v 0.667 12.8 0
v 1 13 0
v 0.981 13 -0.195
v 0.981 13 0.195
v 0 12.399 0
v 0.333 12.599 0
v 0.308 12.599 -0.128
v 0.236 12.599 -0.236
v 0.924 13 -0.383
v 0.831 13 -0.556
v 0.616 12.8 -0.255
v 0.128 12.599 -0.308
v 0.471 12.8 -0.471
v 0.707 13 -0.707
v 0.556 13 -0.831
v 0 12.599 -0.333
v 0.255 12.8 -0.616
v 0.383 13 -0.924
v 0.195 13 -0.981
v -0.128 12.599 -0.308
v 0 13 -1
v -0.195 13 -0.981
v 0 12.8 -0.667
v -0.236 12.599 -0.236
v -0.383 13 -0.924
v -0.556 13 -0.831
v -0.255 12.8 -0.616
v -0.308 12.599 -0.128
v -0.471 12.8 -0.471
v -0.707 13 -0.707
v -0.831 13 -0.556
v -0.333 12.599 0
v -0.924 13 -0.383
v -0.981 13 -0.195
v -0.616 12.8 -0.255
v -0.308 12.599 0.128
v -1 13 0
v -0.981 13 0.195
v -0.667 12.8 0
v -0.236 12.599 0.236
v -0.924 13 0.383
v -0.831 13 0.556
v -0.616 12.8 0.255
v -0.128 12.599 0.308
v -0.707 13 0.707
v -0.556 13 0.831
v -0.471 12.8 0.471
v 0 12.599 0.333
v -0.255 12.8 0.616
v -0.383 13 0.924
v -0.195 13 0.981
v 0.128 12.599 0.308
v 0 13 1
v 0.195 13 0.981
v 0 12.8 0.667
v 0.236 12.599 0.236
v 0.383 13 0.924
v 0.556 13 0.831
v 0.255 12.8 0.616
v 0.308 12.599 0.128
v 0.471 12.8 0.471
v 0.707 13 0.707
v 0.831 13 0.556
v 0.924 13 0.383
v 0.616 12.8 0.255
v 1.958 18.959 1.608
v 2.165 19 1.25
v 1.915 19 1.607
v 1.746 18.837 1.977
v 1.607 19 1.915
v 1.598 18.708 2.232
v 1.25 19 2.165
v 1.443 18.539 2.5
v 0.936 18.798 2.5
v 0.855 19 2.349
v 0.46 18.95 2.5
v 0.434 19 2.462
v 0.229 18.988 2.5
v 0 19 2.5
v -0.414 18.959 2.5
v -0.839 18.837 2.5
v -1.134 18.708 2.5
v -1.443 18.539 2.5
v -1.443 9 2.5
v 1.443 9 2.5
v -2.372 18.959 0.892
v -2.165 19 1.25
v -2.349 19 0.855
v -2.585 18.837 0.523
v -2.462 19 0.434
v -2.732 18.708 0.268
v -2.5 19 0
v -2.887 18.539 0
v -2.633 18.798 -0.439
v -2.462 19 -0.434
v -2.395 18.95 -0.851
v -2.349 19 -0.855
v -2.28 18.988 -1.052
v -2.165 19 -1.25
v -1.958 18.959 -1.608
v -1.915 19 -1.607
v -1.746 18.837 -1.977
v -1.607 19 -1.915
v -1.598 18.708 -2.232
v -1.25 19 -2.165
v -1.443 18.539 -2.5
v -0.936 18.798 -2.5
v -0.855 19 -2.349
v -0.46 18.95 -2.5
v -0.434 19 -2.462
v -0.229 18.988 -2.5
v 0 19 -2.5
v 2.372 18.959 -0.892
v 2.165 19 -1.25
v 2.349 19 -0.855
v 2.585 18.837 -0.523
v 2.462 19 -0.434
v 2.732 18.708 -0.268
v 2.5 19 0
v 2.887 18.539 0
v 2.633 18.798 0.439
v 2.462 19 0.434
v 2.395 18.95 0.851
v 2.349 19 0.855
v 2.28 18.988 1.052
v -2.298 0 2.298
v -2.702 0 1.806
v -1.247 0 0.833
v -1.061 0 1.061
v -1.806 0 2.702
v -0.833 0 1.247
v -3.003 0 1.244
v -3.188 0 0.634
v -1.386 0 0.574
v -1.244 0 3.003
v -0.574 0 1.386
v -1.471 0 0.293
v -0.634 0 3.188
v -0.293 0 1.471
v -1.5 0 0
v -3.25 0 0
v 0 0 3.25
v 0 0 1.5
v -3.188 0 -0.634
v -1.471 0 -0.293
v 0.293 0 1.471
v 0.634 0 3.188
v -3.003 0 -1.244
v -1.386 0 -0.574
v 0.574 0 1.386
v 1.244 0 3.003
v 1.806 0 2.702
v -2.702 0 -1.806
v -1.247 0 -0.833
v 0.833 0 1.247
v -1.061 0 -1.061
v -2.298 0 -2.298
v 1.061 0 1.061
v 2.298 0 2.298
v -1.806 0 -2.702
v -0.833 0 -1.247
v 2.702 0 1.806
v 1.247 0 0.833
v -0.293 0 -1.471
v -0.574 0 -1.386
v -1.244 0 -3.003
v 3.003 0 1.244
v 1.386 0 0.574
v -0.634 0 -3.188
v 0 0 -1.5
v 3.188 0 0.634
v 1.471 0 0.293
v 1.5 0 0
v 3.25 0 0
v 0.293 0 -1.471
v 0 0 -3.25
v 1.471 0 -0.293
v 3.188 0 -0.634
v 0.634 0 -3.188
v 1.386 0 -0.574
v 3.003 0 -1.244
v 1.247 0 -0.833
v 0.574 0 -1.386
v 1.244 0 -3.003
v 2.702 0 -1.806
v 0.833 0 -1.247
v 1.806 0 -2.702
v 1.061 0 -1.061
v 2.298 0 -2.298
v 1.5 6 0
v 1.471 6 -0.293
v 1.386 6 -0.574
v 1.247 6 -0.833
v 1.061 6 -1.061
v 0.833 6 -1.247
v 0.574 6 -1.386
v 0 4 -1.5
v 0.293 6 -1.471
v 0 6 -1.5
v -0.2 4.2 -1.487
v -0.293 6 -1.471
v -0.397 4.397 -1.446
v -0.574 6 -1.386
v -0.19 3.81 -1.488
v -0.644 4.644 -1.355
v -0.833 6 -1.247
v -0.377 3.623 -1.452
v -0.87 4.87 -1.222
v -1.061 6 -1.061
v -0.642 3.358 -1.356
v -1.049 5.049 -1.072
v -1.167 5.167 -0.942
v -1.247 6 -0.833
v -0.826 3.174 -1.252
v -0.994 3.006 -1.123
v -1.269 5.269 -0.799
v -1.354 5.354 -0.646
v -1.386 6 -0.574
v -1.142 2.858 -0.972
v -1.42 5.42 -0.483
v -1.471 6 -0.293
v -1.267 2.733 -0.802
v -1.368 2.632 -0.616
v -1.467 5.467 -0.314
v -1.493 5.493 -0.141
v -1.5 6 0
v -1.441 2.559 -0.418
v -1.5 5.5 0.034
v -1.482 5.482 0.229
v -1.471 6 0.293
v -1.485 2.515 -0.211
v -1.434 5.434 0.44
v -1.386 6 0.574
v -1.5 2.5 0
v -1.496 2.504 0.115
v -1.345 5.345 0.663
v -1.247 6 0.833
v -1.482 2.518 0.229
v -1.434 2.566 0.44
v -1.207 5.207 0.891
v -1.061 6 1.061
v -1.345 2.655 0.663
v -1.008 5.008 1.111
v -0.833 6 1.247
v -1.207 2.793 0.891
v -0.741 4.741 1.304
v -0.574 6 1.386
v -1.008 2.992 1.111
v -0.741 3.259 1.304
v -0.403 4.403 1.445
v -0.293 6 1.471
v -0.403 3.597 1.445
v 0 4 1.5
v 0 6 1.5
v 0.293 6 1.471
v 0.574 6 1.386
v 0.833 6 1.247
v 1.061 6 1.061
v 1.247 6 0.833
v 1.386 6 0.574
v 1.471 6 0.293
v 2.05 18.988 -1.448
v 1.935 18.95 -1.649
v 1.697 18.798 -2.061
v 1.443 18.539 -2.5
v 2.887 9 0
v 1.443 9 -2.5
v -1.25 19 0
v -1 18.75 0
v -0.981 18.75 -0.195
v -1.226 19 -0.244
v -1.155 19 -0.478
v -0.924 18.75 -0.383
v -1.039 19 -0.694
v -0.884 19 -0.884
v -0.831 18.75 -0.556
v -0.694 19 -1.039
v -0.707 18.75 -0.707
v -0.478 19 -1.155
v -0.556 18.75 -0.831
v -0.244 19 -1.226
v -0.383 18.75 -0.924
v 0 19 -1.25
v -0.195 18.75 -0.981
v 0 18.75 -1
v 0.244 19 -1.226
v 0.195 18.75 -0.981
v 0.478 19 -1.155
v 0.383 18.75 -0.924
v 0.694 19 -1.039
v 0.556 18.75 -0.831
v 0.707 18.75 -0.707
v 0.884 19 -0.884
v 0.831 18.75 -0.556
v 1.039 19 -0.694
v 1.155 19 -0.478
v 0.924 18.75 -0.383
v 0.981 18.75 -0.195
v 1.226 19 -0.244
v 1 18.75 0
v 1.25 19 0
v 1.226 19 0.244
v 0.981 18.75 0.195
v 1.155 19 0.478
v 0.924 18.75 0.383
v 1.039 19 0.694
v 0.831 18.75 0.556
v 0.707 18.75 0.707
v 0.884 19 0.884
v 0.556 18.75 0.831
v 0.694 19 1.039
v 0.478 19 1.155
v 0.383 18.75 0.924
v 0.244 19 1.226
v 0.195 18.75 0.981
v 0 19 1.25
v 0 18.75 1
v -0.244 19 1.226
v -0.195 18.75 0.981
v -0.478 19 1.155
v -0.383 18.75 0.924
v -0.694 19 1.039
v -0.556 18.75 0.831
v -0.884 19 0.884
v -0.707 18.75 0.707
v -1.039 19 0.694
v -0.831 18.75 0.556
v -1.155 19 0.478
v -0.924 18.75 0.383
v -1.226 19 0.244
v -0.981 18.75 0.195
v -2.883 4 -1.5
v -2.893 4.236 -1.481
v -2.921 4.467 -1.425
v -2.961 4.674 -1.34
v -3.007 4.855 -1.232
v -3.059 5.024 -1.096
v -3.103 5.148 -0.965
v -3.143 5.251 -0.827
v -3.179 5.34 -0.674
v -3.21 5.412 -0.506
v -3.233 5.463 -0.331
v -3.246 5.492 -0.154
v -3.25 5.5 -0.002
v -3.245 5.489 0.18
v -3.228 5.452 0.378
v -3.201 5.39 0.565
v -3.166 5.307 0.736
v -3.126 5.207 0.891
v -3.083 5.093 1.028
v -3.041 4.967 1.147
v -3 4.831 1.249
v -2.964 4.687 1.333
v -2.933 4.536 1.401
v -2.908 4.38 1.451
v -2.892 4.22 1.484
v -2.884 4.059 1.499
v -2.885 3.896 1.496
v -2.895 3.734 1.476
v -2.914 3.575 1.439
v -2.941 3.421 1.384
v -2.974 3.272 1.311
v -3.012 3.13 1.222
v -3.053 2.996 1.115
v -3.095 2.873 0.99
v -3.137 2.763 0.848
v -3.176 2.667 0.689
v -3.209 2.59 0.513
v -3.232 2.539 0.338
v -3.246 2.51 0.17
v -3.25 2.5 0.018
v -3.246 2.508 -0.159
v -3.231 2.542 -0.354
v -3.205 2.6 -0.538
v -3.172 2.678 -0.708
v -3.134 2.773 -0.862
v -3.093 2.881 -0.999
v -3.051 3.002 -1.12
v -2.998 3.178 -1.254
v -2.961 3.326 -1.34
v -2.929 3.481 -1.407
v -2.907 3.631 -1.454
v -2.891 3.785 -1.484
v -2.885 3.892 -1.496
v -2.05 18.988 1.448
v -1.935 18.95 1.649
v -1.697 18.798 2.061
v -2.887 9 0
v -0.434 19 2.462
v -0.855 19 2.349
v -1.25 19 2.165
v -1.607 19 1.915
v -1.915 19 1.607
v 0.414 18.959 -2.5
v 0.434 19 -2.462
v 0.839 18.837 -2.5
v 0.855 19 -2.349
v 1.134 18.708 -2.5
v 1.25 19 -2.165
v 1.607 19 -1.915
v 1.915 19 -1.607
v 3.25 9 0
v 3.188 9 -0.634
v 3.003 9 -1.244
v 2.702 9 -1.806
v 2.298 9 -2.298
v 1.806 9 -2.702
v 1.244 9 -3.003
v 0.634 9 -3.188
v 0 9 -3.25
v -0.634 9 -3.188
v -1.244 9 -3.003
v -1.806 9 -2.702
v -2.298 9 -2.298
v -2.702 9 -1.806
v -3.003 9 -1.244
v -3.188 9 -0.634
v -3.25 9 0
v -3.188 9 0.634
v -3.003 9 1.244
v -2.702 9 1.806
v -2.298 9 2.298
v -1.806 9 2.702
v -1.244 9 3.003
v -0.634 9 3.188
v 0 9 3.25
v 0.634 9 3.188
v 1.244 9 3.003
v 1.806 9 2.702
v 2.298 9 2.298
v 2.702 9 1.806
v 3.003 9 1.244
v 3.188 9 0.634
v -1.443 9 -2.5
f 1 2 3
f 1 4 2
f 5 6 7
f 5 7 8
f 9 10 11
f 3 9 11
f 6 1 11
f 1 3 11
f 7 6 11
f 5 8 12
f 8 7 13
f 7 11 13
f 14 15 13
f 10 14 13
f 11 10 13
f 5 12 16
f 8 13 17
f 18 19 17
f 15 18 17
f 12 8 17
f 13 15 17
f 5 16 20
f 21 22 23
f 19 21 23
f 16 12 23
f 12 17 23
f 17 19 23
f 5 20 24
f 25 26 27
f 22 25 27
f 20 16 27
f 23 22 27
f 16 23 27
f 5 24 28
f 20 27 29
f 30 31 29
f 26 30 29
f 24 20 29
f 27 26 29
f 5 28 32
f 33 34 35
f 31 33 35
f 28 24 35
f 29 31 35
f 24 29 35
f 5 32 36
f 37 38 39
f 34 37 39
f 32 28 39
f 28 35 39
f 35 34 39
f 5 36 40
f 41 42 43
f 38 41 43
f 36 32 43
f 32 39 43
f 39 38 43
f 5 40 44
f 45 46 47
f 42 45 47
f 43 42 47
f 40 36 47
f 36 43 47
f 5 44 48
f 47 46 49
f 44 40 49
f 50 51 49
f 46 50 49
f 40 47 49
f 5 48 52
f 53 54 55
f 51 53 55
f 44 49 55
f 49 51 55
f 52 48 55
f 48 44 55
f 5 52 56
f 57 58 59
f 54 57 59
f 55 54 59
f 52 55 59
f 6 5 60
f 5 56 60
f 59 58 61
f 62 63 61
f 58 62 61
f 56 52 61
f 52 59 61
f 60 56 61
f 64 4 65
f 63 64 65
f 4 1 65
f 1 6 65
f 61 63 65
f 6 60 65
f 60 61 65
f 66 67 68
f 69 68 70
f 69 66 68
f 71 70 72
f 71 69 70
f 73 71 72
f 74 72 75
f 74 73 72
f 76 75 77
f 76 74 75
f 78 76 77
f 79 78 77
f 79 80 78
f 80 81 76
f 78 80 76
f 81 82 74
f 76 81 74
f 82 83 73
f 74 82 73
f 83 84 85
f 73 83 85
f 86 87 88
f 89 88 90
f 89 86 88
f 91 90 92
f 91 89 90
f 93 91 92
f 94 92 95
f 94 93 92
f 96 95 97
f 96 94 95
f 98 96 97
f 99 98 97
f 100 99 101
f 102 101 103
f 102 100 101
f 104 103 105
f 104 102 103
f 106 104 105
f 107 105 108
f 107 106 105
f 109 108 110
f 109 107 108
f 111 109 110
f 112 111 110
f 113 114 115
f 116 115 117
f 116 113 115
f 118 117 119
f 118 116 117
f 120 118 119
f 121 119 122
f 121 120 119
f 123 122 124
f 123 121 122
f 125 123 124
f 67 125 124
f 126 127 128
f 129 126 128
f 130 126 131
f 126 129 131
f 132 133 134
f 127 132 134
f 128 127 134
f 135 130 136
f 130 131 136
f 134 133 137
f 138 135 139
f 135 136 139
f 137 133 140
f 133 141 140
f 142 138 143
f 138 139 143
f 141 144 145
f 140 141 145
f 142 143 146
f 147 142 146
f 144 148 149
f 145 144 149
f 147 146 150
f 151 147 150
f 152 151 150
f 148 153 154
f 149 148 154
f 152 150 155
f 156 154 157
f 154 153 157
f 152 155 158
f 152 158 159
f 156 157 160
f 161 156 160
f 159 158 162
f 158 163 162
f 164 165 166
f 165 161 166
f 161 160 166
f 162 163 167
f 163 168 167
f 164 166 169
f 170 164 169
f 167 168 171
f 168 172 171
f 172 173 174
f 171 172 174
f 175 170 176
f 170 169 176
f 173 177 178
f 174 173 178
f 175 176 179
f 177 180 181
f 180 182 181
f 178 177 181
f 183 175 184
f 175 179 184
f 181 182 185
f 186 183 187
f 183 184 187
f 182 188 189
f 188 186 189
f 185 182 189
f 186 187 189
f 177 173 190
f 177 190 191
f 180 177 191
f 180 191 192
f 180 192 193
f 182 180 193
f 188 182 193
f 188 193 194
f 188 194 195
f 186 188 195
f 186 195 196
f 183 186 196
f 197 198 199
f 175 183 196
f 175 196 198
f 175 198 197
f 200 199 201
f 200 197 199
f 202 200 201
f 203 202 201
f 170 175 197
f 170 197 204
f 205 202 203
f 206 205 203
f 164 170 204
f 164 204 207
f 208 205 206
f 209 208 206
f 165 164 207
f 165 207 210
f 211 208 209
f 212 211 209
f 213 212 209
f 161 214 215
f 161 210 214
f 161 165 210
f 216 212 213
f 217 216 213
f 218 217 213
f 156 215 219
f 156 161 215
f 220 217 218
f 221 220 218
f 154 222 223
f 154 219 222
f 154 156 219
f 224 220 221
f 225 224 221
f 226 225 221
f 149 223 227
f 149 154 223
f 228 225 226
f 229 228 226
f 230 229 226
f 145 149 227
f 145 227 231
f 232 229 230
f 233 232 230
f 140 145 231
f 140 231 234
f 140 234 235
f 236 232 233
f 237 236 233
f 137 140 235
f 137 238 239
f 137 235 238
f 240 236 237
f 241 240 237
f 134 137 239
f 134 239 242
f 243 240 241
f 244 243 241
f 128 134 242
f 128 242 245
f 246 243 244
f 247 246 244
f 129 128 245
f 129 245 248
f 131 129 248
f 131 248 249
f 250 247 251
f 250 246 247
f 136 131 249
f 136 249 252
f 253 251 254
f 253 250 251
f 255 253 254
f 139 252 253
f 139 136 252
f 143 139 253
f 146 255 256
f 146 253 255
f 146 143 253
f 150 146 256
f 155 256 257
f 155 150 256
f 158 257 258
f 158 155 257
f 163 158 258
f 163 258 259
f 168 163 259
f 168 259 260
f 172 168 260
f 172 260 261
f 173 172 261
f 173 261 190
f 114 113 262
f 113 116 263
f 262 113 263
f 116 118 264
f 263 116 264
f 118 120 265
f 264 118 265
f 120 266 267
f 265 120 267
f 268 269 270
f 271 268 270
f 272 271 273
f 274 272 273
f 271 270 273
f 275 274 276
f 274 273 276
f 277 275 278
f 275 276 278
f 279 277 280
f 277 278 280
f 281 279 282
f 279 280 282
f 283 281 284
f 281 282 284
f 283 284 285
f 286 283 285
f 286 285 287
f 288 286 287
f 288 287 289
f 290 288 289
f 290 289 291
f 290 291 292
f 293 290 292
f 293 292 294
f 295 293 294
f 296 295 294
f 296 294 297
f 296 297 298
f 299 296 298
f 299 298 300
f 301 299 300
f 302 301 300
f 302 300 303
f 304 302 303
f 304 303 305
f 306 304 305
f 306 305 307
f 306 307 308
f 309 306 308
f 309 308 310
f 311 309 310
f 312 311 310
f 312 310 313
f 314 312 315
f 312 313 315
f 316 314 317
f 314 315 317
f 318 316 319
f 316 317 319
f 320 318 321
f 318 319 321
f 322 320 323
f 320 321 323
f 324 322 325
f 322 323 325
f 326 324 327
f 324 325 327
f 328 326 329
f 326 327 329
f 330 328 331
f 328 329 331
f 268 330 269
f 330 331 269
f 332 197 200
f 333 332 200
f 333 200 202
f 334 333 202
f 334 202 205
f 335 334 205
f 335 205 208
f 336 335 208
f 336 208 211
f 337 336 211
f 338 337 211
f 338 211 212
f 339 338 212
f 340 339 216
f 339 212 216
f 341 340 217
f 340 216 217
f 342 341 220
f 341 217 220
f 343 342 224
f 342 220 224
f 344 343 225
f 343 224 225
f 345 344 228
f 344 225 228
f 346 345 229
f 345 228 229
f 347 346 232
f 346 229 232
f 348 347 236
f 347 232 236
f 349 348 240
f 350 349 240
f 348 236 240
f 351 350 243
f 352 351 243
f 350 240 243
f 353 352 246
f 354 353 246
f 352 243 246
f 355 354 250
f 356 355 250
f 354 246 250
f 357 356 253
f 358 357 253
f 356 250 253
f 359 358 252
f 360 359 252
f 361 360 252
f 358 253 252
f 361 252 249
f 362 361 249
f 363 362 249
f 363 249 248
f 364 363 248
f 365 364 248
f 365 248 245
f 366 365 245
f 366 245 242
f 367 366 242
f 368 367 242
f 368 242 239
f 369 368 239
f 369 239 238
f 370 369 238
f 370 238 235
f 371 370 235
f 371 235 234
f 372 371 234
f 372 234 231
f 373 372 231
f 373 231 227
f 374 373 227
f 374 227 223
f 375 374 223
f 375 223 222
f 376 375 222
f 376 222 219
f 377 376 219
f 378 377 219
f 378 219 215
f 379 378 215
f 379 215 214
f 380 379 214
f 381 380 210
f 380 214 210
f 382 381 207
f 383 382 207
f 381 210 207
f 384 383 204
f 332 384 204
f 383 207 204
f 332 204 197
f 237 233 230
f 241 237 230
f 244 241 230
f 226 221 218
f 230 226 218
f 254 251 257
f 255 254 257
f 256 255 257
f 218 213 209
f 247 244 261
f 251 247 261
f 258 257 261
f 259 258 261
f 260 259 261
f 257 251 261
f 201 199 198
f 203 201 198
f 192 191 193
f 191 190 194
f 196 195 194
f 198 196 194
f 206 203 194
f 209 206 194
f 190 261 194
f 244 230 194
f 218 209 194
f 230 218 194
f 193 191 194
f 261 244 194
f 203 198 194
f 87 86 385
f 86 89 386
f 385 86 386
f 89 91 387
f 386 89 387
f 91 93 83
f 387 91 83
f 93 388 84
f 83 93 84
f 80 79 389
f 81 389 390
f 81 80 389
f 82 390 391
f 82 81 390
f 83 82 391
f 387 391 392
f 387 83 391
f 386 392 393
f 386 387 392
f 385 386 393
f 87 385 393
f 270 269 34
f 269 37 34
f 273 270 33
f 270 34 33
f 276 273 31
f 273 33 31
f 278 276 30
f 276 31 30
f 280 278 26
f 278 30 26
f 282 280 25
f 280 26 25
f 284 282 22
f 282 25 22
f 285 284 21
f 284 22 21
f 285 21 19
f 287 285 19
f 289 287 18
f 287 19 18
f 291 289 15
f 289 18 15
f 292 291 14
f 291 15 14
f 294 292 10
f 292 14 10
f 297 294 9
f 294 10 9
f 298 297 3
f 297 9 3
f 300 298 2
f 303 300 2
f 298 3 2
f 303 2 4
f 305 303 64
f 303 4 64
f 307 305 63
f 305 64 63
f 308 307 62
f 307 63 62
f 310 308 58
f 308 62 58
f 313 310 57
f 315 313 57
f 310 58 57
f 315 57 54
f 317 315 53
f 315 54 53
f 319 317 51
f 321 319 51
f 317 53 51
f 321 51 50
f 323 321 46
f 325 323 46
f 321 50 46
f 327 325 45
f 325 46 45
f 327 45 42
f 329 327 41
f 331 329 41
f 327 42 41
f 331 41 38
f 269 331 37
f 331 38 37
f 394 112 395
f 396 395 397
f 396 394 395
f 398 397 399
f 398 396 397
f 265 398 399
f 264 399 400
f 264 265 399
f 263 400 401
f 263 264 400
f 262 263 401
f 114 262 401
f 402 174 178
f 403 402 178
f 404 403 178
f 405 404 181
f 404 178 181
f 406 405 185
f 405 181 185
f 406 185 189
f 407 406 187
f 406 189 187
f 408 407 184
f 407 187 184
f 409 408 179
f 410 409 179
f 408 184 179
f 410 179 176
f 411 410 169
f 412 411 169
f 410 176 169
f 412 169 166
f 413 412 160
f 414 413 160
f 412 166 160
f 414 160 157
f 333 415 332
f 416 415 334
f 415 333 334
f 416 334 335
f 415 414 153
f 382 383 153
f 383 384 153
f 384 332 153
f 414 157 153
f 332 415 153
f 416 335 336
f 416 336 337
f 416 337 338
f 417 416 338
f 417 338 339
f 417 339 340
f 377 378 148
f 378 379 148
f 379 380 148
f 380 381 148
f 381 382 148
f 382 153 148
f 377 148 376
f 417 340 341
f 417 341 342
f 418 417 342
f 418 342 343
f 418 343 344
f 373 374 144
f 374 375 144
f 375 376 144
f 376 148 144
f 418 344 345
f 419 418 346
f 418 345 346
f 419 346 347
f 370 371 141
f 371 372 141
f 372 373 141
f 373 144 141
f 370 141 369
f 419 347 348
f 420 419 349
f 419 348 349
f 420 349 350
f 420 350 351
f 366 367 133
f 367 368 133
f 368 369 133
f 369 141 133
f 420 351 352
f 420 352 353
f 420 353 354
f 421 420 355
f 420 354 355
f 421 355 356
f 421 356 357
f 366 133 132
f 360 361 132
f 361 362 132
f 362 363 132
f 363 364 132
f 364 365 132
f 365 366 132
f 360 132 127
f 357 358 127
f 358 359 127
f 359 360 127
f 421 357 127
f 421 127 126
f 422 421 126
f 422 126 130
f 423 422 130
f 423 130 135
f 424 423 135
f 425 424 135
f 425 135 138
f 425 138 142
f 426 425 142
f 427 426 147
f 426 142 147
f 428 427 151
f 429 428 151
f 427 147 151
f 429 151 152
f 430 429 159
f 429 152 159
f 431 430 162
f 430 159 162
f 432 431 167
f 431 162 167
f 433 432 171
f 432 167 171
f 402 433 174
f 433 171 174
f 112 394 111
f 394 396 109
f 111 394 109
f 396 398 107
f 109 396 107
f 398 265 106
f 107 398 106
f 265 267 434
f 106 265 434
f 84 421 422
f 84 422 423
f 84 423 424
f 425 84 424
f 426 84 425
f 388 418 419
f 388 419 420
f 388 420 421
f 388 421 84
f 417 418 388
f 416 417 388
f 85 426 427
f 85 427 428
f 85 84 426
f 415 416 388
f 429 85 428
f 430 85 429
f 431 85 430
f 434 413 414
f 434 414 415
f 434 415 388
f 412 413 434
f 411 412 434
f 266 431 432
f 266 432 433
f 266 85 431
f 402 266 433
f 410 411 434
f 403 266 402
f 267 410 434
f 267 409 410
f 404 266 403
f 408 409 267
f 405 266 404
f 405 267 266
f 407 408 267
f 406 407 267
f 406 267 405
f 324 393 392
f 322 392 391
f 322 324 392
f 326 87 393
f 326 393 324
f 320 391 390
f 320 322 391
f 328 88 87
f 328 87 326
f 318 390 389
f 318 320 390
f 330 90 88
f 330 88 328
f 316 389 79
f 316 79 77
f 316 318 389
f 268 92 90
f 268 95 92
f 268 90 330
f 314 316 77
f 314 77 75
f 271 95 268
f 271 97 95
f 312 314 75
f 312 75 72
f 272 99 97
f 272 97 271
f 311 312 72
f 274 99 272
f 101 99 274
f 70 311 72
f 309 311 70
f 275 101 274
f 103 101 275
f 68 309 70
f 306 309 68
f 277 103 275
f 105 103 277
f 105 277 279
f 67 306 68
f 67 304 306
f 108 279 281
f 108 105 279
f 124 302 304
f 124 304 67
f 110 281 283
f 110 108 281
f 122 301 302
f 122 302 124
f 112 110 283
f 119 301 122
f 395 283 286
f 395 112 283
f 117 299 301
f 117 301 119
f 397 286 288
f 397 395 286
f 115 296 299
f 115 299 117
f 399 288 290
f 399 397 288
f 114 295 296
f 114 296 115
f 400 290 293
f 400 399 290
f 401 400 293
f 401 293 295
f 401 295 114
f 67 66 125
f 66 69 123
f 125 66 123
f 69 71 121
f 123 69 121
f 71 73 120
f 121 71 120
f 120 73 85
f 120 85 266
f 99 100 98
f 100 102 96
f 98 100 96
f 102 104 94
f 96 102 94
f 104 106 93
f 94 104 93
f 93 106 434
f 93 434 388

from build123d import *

# Parameters (mm, degrees)
SKETCH1_R                                         = 3.25
SKETCH1_R_2                                       = 1.5
BOSS_EXTRUDE1_DEPTH                               = 6
SKETCH2_R                                         = 3.25
BOSS_EXTRUDE2_DEPTH                               = 3
BOSS_EXTRUDE3_DEPTH                               = 10
SKETCH4_OUTSIDE_W                                 = 29.504
SKETCH4_OUTSIDE_H                                 = 29.504
SKETCH4_OUTSIDE_R                                 = 2.5
CUT_EXTRUDE1_DEPTH                                = 10
CUT_EXTRUDE1_TAPER                                = 40
CSK_FOR_M2_5_FLAT_HEAD_MACHINE_SCREW1_D           = 2
CSK_FOR_M2_5_FLAT_HEAD_MACHINE_SCREW1_DEPTH       = 6
CSK_FOR_M2_5_FLAT_HEAD_MACHINE_SCREW1_CSINK_D     = 2.5
CSK_FOR_M2_5_FLAT_HEAD_MACHINE_SCREW1_CSINK_ANGLE = 90
CSK_FOR_M2_5_FLAT_HEAD_MACHINE_SCREW1_TIP         = 0.600860619
SKETCH8_R                                         = 1.5
CUT_EXTRUDE2_DEPTH                                = 4.25


with BuildPart() as part:
    # Sketch1 → Boss-Extrude1 (new body)
    with BuildSketch(Plane(origin=(0, 0, 0), x_dir=(1, 0, 0), z_dir=(0, 1, 0))):
        Circle(SKETCH1_R)
        Circle(SKETCH1_R_2, mode=Mode.SUBTRACT)
    extrude(amount=BOSS_EXTRUDE1_DEPTH)

    # Sketch2 → Boss-Extrude2 (add)
    with BuildSketch(Plane(origin=(0, 6, 0), x_dir=(1, 0, 0), z_dir=(0, 1, 0))):
        Circle(SKETCH2_R)
    extrude(amount=BOSS_EXTRUDE2_DEPTH)

    # Sketch3 → Boss-Extrude3 (add)
    with BuildSketch(Plane(origin=(0, 9, 0), x_dir=(1, 0, 0), z_dir=(0, 1, 0))):
        Polygon((2.886751346, 0), (1.443375673, 2.5), (-1.443375673, 2.5), (-2.886751346, 0), (-1.443375673, -2.5), (1.443375673, -2.5), align=None)
    extrude(amount=BOSS_EXTRUDE3_DEPTH)

    # Sketch4 outside → Cut-Extrude1 (cut)
    with BuildSketch(Plane(origin=(0, 19, 0), x_dir=(1, 0, 0), z_dir=(0, 1, 0))):
        Rectangle(SKETCH4_OUTSIDE_W, SKETCH4_OUTSIDE_H)
        Circle(SKETCH4_OUTSIDE_R, mode=Mode.SUBTRACT)
    extrude(amount=-CUT_EXTRUDE1_DEPTH, taper=CUT_EXTRUDE1_TAPER, mode=Mode.SUBTRACT)

    # CSK for M2.5 Flat Head Machine Screw1
    with Locations(Plane(origin=(0, 19, 0), x_dir=(1, 0, 0), z_dir=(0, 1, 0))):
        with Locations((0, 0)):
            CounterSinkHole(CSK_FOR_M2_5_FLAT_HEAD_MACHINE_SCREW1_D / 2, CSK_FOR_M2_5_FLAT_HEAD_MACHINE_SCREW1_CSINK_D / 2, depth=CSK_FOR_M2_5_FLAT_HEAD_MACHINE_SCREW1_DEPTH, counter_sink_angle=CSK_FOR_M2_5_FLAT_HEAD_MACHINE_SCREW1_CSINK_ANGLE)
            with Locations((0, 0, -(CSK_FOR_M2_5_FLAT_HEAD_MACHINE_SCREW1_DEPTH + CSK_FOR_M2_5_FLAT_HEAD_MACHINE_SCREW1_TIP / 2))):  # 118° drill point
                Cone(0, CSK_FOR_M2_5_FLAT_HEAD_MACHINE_SCREW1_D / 2, CSK_FOR_M2_5_FLAT_HEAD_MACHINE_SCREW1_TIP, mode=Mode.SUBTRACT)

    # Sketch8 → Cut-Extrude2 (cut, through all)
    with BuildSketch(Plane(origin=(0, 0, 0), x_dir=(0, 0, -1), z_dir=(1, 0, 0))):
        with Locations((0, 4)):
            Circle(SKETCH8_R)
    extrude(amount=-CUT_EXTRUDE2_DEPTH, mode=Mode.SUBTRACT)


solid = part.part
